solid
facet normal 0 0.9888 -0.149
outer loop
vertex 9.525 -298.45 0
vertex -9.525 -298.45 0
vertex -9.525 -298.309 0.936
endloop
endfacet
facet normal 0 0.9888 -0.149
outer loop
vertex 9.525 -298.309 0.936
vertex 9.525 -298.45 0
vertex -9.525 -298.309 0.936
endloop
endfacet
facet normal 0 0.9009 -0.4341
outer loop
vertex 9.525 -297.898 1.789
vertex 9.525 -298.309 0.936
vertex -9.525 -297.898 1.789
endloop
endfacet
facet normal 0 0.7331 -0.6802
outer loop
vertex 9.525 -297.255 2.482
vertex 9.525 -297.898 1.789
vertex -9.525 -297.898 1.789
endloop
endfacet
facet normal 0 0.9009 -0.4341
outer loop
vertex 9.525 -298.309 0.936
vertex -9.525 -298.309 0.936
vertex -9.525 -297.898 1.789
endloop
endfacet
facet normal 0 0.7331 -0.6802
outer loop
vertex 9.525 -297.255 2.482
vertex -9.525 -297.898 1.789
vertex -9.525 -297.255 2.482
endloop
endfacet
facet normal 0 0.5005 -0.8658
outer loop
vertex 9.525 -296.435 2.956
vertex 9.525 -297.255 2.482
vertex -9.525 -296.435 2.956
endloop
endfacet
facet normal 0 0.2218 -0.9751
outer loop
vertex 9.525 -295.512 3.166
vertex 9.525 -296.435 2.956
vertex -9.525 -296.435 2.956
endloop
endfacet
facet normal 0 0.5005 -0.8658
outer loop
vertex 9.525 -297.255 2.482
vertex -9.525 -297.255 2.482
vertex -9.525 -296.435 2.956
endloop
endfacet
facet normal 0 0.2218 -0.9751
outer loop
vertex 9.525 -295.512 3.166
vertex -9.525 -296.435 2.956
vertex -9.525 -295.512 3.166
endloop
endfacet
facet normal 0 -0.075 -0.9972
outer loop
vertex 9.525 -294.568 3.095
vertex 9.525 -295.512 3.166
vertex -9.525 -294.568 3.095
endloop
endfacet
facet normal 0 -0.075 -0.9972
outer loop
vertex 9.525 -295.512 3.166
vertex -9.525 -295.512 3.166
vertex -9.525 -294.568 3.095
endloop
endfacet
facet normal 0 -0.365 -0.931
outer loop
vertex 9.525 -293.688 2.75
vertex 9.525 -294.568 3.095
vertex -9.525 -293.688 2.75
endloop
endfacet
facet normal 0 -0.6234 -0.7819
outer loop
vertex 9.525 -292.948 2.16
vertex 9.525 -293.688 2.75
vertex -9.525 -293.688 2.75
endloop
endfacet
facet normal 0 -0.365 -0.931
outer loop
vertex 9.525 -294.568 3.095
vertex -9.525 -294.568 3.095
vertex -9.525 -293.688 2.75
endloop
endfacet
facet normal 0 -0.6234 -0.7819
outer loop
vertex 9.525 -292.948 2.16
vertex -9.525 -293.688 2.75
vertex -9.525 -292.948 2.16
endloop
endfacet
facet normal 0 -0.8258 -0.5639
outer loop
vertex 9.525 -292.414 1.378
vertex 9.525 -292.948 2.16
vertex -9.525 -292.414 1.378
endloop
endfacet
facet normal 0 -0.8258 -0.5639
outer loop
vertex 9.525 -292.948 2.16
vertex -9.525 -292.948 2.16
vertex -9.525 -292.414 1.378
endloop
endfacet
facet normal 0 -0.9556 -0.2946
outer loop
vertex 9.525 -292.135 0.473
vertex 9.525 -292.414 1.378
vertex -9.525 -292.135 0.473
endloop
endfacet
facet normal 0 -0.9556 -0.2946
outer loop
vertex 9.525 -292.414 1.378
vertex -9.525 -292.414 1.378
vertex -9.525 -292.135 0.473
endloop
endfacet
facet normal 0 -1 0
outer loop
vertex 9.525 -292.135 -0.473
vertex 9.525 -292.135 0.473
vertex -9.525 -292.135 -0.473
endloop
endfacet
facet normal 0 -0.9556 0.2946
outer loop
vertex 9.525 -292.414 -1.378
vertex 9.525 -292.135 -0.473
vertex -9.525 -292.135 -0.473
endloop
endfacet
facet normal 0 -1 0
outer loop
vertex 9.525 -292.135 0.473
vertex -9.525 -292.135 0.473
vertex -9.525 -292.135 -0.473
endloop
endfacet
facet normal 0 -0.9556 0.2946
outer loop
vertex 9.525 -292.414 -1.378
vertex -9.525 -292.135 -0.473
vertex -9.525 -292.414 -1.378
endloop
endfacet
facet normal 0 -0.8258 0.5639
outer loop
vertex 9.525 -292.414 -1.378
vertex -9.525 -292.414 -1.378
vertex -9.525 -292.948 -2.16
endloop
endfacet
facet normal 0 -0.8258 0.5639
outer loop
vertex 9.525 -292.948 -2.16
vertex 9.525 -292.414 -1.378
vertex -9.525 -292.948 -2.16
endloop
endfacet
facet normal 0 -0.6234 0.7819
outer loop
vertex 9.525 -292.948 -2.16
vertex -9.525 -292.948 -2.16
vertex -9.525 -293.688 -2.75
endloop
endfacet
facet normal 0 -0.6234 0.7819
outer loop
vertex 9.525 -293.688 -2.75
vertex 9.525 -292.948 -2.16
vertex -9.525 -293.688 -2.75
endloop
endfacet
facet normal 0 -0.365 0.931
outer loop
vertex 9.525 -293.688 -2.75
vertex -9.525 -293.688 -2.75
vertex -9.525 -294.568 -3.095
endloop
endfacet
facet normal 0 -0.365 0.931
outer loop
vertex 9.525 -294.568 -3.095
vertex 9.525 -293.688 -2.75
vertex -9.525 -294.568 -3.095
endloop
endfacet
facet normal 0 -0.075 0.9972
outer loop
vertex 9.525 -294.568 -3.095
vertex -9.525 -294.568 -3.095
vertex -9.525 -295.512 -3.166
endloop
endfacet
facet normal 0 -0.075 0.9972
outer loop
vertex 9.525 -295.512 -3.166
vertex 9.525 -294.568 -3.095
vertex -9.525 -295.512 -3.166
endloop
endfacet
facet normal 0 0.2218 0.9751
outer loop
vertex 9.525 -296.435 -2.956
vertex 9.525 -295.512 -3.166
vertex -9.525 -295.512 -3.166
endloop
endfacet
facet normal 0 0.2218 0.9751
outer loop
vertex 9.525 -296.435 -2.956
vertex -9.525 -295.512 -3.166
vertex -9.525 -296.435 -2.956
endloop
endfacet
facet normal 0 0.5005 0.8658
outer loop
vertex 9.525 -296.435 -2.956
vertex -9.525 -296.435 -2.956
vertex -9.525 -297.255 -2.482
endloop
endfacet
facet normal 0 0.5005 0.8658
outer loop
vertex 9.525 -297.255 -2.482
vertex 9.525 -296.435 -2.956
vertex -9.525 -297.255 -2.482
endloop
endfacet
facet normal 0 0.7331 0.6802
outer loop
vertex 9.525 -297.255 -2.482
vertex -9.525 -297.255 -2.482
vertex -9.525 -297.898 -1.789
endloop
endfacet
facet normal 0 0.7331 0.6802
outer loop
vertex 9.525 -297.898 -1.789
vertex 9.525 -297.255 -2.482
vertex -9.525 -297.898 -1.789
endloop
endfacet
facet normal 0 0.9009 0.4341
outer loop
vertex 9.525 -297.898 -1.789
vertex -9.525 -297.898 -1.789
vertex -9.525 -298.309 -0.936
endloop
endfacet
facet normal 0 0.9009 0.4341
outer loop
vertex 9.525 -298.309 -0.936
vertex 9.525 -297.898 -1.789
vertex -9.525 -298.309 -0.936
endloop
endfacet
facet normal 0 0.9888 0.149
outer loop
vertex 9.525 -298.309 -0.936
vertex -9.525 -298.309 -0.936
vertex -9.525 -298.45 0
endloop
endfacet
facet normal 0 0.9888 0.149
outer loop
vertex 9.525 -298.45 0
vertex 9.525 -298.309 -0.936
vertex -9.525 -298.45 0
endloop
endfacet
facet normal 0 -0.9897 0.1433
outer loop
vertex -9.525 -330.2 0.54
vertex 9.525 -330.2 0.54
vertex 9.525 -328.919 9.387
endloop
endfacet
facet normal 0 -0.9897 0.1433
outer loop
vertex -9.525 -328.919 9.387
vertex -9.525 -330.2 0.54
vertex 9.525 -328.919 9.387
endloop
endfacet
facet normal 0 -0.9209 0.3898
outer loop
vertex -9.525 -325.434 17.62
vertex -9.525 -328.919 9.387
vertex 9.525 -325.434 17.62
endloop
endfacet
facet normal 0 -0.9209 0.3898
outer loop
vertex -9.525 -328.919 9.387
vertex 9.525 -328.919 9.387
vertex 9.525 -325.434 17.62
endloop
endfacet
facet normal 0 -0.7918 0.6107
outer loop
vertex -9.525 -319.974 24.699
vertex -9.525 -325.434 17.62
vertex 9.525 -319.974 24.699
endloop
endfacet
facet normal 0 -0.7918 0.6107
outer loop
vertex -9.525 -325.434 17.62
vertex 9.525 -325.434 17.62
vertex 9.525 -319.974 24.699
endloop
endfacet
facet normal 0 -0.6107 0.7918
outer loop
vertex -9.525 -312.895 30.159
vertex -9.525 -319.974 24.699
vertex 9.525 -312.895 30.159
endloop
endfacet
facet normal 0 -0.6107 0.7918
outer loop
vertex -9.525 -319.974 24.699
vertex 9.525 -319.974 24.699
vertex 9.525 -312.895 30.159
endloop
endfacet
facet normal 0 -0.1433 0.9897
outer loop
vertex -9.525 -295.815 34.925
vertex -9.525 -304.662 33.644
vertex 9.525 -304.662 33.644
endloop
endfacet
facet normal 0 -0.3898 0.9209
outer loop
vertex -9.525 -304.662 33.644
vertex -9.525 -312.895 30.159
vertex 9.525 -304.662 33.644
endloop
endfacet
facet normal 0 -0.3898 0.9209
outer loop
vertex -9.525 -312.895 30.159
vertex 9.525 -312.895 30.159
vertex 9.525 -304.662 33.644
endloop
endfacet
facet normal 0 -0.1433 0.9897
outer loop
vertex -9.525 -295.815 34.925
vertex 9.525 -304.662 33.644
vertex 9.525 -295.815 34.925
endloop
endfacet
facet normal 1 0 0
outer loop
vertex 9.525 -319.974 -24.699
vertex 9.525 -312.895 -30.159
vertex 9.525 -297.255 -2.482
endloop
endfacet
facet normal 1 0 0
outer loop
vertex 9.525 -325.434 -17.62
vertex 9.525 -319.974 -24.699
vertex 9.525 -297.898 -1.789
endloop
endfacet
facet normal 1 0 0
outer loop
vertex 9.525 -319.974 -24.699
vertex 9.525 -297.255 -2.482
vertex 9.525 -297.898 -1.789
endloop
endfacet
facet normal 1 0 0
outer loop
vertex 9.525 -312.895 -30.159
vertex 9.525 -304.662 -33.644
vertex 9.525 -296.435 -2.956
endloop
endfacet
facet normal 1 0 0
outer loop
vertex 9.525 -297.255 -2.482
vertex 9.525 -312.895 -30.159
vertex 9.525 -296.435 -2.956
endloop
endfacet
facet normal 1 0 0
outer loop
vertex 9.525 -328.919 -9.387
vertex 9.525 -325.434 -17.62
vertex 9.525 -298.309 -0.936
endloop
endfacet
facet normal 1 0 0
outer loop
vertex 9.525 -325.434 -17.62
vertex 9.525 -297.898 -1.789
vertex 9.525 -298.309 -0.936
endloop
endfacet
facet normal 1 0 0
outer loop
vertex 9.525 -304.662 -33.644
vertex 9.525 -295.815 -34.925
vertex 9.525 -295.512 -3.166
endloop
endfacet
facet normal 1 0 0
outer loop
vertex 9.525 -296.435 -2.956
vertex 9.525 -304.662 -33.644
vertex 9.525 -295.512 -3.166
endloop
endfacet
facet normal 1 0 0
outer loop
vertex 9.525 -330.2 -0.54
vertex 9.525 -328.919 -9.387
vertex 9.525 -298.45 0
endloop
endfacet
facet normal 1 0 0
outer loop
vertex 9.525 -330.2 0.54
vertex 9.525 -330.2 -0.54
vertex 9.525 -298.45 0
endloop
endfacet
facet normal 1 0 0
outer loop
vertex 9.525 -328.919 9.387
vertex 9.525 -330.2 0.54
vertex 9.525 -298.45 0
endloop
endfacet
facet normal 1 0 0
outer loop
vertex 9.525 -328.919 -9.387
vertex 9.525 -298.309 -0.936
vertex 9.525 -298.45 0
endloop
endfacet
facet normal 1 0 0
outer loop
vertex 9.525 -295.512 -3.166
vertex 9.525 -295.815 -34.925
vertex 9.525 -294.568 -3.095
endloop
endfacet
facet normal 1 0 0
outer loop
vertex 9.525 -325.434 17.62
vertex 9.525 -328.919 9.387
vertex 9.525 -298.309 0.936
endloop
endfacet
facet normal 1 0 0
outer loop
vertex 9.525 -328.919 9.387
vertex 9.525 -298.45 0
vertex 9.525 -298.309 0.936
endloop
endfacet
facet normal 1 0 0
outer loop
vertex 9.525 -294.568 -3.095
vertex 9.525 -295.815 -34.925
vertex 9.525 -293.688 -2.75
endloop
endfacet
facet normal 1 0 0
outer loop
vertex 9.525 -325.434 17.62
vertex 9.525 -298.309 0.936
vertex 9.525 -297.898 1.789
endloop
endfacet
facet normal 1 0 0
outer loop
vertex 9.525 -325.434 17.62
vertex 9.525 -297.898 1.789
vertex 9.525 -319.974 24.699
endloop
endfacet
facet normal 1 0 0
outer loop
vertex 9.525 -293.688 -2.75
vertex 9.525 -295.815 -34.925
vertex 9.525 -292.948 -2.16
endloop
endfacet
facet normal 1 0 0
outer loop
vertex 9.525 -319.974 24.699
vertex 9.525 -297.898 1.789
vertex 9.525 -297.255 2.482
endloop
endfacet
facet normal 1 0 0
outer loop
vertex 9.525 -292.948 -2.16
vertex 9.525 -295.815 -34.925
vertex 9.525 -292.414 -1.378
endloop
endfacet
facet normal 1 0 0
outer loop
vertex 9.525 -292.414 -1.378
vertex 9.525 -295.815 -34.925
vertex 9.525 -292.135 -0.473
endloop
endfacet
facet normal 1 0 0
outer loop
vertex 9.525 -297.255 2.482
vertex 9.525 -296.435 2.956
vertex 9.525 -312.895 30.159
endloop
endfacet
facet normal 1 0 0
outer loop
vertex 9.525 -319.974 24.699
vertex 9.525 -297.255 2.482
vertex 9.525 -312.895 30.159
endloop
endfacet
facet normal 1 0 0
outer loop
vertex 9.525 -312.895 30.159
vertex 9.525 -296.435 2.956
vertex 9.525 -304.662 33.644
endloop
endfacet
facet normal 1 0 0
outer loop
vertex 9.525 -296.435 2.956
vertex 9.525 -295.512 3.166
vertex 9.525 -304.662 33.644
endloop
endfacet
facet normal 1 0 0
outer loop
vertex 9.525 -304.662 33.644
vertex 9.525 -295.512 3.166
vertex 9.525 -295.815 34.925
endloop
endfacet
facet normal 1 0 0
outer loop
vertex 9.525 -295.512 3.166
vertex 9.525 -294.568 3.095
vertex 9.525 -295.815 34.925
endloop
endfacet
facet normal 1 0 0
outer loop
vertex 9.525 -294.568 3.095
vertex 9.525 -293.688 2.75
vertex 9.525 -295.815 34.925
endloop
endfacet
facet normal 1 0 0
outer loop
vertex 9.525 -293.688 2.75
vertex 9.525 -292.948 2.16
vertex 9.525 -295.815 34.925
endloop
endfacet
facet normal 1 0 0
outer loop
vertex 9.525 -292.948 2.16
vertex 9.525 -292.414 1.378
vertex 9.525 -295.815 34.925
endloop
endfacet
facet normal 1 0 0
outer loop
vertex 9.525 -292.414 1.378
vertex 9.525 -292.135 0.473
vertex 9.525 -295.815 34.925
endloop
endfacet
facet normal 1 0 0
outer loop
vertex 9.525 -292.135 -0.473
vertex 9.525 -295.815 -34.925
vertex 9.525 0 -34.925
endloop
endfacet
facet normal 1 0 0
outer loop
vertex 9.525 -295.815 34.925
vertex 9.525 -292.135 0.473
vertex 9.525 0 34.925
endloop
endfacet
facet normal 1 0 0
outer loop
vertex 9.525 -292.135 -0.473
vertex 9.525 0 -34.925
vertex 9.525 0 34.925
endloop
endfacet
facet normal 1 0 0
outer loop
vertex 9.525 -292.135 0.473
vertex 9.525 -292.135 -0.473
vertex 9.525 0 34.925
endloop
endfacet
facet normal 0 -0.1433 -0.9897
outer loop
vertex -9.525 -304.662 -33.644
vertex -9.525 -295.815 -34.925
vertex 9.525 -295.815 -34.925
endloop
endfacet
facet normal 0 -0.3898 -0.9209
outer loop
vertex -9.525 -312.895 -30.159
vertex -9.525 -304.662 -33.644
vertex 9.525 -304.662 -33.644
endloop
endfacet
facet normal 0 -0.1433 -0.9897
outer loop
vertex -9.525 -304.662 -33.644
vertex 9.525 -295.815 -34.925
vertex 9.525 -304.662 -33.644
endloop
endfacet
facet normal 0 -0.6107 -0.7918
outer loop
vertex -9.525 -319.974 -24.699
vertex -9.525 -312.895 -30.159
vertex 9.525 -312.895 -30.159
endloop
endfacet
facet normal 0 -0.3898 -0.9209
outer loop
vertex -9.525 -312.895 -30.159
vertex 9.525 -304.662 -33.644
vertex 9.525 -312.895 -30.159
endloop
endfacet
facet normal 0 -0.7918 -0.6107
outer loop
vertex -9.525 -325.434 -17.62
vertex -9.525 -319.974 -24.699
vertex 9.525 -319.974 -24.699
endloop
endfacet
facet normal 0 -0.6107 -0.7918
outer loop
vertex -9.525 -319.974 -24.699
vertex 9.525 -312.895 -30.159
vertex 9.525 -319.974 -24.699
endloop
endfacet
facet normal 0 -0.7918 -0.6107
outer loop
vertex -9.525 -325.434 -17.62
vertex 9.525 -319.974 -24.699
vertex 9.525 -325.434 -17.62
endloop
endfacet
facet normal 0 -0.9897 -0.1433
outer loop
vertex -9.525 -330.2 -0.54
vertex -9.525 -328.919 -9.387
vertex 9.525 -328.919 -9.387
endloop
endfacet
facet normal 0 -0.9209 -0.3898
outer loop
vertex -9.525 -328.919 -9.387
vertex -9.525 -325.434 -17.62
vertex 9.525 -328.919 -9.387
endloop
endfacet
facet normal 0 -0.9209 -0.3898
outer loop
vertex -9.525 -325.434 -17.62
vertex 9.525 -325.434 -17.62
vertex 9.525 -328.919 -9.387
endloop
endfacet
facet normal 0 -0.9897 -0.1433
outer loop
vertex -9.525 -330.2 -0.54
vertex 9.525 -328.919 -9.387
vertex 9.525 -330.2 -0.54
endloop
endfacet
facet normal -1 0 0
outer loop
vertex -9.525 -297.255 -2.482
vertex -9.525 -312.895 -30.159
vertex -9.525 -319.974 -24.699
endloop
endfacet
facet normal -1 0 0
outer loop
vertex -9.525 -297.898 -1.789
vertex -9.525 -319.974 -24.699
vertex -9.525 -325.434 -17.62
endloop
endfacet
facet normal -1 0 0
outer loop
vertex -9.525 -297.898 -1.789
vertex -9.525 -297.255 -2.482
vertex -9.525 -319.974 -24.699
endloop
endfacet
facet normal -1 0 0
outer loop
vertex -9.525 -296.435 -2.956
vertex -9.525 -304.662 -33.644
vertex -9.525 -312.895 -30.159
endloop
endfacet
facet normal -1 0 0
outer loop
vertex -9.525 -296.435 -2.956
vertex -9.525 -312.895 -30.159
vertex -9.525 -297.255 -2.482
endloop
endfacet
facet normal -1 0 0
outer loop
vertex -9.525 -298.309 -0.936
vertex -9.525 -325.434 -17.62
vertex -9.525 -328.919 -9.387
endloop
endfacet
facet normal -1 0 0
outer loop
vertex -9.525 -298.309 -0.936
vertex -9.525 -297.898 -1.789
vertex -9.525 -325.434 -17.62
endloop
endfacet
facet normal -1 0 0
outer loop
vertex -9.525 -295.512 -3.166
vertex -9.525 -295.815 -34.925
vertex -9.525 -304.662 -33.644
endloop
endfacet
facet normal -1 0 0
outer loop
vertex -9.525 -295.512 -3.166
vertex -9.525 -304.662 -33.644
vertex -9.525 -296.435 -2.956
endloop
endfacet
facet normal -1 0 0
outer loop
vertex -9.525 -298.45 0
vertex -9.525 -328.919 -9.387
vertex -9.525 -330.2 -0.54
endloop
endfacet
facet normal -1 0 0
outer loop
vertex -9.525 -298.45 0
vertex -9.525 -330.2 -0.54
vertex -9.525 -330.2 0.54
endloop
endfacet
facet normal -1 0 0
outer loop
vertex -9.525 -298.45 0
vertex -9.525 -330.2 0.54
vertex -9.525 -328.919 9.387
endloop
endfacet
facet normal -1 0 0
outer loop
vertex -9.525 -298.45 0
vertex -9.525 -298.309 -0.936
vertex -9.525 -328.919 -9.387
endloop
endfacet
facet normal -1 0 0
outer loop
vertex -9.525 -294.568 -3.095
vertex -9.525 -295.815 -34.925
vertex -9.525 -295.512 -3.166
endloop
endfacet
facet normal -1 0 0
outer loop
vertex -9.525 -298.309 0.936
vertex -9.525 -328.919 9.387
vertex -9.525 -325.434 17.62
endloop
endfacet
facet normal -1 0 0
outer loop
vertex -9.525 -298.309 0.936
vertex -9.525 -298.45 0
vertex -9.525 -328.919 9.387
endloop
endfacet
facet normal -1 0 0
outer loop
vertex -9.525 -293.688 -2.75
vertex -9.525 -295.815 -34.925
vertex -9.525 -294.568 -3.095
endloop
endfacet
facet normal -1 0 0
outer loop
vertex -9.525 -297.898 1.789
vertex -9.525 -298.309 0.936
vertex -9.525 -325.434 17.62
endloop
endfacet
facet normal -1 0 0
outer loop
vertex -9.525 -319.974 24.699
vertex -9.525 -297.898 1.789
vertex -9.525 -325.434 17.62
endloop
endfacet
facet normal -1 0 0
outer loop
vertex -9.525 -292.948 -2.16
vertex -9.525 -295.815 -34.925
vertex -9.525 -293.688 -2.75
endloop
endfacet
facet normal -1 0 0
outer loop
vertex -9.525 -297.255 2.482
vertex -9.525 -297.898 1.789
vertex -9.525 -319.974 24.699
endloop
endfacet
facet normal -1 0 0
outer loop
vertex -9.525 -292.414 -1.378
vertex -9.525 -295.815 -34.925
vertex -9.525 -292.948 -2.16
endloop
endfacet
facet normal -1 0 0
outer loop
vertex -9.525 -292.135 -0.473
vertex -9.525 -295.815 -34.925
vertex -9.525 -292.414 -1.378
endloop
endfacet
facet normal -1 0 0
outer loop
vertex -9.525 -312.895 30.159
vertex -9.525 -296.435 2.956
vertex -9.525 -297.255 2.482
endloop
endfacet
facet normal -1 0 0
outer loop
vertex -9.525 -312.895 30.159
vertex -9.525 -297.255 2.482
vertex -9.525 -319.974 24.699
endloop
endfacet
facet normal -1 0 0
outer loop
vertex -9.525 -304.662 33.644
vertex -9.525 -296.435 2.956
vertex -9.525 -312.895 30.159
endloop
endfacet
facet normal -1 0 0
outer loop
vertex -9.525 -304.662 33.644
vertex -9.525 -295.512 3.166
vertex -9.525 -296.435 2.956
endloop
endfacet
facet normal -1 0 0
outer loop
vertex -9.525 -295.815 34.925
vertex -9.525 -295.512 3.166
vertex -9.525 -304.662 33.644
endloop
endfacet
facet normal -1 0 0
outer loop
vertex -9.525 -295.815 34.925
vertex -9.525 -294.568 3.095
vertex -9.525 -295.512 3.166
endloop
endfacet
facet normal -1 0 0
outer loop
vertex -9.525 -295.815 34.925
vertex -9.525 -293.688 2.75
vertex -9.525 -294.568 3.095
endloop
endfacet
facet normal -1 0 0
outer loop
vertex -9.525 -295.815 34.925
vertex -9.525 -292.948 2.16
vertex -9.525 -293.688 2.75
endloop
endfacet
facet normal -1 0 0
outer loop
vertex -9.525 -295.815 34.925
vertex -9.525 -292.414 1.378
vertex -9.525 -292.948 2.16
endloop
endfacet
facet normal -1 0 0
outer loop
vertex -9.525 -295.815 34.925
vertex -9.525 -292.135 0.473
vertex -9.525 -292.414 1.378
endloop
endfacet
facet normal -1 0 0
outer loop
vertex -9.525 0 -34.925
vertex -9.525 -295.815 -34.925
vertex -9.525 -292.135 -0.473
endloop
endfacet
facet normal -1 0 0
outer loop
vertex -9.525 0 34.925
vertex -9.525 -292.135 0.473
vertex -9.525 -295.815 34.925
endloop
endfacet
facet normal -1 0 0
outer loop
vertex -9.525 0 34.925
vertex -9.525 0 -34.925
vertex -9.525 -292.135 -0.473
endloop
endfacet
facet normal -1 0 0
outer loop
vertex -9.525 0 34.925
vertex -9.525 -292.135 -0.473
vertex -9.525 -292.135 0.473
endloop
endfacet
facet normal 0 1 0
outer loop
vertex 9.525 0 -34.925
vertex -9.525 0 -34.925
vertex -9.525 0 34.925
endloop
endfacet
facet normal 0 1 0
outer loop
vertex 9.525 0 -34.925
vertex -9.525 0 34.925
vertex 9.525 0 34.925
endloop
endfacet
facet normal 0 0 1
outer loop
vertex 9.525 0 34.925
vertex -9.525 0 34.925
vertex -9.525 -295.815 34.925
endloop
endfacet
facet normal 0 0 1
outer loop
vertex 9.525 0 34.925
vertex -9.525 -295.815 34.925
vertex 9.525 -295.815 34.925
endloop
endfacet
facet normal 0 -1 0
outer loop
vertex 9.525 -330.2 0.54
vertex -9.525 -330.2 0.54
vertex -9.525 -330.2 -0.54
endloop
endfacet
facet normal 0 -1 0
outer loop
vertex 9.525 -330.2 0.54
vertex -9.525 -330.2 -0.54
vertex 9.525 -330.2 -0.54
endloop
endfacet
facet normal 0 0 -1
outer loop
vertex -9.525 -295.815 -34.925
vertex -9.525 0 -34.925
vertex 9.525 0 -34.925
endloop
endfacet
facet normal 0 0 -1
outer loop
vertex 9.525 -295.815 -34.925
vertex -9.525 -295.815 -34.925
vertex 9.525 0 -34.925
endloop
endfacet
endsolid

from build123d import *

# Parameters (mm, degrees)
F0_W     = 19.05
F0_H     = 69.85
F1_DEPTH = 330.2
F3_D     = 6.35
F5_DEPTH = 19.051
F6_W     = 25.4
F6_H     = 25.4
F7_DEPTH = 304.8


with BuildPart() as f1:
    # F0 (on Front) → F1 (new body)
    with BuildSketch(Plane.XZ):
        Rectangle(F0_W, F0_H)
    extrude(amount=F1_DEPTH)

    # F3 (through all)
    with Locations(Plane.YZ.offset(9.525)):
        with Locations((-295.275, 0)):
            Hole(F3_D / 2)

    # F4 (on face) → F5 (cut, through all)
    with BuildSketch(Plane.YZ.offset(9.525)):
        with BuildLine():
            Line((-330.2, -34.925), (-295.814604, -34.925))
            ThreePointArc((-295.814604, -34.925), (-319.973652, -24.698652), (-330.2, -0.539604))
            Line((-330.2, -0.539604), (-330.2, -34.925))
        make_face()
        with BuildLine():
            Line((-330.2, 34.925), (-330.2, 0.539604))
            ThreePointArc((-330.2, 0.539604), (-319.973652, 24.698652), (-295.814604, 34.925))
            Line((-295.814604, 34.925), (-330.2, 34.925))
        make_face()
    extrude(amount=-F5_DEPTH, mode=Mode.SUBTRACT)


with BuildPart() as f7:
    # F6 (on Front) → F7 (new body)
    with BuildSketch(Plane.XZ):
        with Locations((72.780613, -13.592582)):
            Rectangle(F6_W, F6_H)
    extrude(amount=F7_DEPTH)


solid = f1.part
